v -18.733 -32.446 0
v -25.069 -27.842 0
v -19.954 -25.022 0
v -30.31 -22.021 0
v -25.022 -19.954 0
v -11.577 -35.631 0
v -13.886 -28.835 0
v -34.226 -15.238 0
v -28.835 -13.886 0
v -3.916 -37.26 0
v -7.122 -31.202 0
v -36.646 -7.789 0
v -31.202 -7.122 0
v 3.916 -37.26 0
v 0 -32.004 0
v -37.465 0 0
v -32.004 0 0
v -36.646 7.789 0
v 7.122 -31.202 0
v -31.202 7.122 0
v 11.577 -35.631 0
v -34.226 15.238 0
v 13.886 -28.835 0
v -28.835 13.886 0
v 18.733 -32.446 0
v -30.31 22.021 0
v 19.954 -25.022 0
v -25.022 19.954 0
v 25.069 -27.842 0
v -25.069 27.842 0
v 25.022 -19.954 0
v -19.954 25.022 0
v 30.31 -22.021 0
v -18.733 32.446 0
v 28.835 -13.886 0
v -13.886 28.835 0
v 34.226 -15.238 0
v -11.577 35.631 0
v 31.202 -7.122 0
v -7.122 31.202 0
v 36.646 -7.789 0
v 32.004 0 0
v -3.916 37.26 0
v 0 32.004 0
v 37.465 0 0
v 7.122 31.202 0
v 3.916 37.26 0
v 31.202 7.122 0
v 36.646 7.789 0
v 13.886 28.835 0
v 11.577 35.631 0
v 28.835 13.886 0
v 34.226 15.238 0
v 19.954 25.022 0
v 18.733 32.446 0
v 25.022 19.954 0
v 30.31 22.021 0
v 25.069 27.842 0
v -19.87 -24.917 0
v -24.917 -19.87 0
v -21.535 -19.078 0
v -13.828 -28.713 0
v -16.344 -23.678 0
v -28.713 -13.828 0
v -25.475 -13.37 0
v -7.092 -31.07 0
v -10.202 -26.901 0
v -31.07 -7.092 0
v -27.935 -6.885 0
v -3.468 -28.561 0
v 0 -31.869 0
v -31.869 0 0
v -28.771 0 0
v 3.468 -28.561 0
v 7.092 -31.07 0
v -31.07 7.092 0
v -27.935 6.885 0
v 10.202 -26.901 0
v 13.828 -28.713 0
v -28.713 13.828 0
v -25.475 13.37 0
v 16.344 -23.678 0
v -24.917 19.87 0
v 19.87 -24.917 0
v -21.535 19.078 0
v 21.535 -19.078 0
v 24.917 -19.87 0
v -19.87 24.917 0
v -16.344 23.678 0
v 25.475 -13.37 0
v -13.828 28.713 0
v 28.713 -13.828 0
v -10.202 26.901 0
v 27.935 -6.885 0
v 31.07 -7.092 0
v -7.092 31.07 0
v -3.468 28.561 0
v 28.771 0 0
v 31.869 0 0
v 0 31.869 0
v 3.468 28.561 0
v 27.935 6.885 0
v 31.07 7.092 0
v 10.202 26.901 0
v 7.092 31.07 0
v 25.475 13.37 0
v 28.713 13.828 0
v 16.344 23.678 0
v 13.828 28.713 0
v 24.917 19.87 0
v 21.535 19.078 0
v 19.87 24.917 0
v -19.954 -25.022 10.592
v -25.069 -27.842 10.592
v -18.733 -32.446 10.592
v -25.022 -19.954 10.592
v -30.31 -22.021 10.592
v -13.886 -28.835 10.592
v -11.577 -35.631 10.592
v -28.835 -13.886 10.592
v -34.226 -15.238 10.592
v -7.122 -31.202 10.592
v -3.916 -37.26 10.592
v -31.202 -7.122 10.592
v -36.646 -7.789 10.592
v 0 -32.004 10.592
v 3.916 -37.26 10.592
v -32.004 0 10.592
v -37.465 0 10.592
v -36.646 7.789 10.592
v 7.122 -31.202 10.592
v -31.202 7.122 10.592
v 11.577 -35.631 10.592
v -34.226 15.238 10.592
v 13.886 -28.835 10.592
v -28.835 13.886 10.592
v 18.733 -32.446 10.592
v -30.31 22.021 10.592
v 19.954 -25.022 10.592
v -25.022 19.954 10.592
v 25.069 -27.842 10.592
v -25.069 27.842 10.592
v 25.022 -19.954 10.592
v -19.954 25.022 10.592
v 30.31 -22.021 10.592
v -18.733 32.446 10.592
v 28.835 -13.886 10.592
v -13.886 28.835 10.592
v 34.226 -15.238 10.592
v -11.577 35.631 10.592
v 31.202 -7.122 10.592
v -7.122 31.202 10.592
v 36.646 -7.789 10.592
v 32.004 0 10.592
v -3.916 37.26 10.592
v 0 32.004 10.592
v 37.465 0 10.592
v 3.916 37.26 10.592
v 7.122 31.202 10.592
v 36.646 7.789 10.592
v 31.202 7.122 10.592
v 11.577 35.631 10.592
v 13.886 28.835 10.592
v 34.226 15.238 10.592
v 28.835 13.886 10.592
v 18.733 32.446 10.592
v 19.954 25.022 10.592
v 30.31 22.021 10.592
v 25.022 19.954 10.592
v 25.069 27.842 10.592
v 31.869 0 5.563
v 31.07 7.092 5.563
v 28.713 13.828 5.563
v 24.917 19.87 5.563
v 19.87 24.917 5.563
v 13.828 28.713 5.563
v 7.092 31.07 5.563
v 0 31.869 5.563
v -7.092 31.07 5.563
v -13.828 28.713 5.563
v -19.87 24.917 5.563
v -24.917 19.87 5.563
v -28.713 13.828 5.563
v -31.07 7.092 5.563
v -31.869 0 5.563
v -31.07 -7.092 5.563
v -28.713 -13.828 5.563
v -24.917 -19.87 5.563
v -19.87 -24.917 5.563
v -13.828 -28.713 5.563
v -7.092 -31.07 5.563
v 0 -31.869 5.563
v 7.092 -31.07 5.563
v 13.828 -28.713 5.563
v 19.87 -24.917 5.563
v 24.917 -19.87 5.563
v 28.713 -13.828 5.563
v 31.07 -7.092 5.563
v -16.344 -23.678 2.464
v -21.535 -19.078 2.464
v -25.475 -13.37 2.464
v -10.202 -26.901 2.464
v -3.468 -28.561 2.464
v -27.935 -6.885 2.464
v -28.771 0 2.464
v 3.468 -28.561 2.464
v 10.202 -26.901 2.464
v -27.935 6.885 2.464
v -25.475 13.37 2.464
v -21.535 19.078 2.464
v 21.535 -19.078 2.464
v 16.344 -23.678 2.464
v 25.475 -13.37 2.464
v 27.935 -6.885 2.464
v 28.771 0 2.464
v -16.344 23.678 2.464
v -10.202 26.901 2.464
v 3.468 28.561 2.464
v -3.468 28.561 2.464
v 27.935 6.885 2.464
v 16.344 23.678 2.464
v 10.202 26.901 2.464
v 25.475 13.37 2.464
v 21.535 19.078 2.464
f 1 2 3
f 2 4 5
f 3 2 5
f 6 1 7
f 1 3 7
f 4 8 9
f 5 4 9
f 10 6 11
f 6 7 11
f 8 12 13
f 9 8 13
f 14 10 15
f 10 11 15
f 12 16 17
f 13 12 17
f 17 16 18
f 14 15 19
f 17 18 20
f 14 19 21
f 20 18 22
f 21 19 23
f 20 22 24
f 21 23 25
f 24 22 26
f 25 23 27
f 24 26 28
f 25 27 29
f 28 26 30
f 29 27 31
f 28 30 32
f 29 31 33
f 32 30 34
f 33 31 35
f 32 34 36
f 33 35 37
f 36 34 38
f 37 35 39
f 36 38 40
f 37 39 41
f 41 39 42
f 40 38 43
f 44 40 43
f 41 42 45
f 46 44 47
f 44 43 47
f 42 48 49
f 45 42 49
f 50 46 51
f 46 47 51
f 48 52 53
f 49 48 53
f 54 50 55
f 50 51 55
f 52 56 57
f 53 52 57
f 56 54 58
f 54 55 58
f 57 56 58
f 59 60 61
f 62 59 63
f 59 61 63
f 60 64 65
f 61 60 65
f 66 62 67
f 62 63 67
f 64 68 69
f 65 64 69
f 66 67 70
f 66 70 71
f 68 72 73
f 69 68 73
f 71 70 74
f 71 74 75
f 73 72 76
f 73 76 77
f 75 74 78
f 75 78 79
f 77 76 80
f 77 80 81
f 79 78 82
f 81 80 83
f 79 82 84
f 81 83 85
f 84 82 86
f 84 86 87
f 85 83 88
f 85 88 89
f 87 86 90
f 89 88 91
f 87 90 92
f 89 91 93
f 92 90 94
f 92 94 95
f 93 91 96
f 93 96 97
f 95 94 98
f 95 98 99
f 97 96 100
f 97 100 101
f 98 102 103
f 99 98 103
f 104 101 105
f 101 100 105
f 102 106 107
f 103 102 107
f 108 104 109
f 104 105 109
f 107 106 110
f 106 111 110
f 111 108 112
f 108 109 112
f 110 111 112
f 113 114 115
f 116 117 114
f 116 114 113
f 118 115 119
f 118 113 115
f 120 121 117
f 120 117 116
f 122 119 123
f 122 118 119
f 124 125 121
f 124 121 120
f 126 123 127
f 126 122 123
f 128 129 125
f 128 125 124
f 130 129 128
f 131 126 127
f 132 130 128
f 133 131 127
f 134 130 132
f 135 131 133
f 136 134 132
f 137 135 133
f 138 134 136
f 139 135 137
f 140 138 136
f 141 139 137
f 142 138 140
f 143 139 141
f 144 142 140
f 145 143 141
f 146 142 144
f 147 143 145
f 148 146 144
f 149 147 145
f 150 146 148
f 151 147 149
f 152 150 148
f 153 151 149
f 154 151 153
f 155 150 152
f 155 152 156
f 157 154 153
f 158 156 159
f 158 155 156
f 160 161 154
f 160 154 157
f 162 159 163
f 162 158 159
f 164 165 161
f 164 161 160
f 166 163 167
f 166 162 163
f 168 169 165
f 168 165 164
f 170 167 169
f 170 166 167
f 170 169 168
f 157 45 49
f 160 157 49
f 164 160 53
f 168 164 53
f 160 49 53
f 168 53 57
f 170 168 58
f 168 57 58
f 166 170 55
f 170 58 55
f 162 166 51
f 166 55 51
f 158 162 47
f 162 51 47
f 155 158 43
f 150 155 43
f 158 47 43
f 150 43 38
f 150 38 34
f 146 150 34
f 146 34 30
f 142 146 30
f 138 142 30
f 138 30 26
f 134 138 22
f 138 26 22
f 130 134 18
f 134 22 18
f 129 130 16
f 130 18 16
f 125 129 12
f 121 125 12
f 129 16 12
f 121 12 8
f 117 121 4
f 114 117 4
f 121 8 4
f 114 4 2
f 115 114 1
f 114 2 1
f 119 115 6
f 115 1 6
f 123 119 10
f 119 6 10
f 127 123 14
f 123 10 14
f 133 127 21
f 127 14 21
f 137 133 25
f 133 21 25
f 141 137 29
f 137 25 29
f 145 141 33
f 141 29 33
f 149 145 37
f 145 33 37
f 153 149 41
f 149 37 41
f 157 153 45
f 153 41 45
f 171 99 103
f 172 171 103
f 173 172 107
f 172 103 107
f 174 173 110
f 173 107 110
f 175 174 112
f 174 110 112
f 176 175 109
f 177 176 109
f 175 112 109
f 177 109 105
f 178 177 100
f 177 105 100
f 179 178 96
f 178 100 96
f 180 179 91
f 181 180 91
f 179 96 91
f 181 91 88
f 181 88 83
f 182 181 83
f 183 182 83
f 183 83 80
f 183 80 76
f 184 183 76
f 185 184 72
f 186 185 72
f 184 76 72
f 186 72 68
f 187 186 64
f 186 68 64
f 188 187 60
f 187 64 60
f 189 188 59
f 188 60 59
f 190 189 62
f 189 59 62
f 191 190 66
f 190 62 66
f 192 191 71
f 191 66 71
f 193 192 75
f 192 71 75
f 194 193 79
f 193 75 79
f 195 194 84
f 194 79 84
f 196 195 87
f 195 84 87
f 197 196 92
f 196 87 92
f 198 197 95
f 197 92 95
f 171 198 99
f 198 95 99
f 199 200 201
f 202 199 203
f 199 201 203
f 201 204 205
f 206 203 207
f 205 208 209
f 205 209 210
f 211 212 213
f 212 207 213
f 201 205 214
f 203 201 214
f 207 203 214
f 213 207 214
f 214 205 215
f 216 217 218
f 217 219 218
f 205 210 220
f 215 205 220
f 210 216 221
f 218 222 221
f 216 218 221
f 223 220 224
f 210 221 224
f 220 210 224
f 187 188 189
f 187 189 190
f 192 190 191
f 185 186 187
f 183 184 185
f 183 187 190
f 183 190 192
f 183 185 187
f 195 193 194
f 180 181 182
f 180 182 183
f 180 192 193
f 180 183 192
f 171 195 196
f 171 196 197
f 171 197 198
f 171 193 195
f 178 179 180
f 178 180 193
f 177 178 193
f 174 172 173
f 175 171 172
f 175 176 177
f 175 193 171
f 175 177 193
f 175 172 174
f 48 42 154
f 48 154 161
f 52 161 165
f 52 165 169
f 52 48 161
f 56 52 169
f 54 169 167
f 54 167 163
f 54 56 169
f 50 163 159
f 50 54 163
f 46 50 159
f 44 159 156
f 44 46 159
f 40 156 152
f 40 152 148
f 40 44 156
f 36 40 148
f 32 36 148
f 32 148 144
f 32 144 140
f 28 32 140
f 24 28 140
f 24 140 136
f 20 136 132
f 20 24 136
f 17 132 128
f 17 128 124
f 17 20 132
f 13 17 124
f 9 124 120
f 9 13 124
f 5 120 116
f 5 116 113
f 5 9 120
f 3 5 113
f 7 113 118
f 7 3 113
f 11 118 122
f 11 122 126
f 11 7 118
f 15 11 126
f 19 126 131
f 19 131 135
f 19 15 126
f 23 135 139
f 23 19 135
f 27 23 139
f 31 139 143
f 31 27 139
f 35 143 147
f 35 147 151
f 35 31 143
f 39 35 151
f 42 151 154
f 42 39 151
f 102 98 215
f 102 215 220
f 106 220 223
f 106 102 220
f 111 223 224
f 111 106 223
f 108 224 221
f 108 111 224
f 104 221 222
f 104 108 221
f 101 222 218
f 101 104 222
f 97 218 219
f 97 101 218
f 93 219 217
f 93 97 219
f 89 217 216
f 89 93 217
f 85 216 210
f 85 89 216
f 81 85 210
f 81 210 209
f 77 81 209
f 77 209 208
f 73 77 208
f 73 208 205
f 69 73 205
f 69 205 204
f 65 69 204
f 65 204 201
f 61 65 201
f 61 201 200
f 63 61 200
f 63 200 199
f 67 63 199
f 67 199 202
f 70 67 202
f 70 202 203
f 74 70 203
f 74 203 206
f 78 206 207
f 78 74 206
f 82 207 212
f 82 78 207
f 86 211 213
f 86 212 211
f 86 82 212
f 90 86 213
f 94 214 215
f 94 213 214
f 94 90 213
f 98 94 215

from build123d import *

# Parameters (mm, degrees)
F0_R     = 37.465
F0_R_2   = 32.004
F1_DEPTH = 10.5918
F2_R     = 31.869416
F3_DEPTH = 5.5626
F4_T     = -3.0988


with BuildPart() as f1:
    # F0 (on Top) → F1 (new body)
    with BuildSketch(Plane.XY):
        Circle(F0_R)
        Circle(F0_R_2, mode=Mode.SUBTRACT)
    extrude(amount=F1_DEPTH)


with BuildPart() as f3:
    # F2 (on Top) → F3 (new body)
    with BuildSketch(Plane.XY):
        Circle(F2_R)
    extrude(amount=F3_DEPTH)

    # F4
    f4_openings = [f3.faces().sort_by_distance(p)[0] for p in [
        (0, 0, 0),
    ]]
    offset(amount=F4_T, openings=f4_openings)


solid = Compound([f1.part, f3.part])
